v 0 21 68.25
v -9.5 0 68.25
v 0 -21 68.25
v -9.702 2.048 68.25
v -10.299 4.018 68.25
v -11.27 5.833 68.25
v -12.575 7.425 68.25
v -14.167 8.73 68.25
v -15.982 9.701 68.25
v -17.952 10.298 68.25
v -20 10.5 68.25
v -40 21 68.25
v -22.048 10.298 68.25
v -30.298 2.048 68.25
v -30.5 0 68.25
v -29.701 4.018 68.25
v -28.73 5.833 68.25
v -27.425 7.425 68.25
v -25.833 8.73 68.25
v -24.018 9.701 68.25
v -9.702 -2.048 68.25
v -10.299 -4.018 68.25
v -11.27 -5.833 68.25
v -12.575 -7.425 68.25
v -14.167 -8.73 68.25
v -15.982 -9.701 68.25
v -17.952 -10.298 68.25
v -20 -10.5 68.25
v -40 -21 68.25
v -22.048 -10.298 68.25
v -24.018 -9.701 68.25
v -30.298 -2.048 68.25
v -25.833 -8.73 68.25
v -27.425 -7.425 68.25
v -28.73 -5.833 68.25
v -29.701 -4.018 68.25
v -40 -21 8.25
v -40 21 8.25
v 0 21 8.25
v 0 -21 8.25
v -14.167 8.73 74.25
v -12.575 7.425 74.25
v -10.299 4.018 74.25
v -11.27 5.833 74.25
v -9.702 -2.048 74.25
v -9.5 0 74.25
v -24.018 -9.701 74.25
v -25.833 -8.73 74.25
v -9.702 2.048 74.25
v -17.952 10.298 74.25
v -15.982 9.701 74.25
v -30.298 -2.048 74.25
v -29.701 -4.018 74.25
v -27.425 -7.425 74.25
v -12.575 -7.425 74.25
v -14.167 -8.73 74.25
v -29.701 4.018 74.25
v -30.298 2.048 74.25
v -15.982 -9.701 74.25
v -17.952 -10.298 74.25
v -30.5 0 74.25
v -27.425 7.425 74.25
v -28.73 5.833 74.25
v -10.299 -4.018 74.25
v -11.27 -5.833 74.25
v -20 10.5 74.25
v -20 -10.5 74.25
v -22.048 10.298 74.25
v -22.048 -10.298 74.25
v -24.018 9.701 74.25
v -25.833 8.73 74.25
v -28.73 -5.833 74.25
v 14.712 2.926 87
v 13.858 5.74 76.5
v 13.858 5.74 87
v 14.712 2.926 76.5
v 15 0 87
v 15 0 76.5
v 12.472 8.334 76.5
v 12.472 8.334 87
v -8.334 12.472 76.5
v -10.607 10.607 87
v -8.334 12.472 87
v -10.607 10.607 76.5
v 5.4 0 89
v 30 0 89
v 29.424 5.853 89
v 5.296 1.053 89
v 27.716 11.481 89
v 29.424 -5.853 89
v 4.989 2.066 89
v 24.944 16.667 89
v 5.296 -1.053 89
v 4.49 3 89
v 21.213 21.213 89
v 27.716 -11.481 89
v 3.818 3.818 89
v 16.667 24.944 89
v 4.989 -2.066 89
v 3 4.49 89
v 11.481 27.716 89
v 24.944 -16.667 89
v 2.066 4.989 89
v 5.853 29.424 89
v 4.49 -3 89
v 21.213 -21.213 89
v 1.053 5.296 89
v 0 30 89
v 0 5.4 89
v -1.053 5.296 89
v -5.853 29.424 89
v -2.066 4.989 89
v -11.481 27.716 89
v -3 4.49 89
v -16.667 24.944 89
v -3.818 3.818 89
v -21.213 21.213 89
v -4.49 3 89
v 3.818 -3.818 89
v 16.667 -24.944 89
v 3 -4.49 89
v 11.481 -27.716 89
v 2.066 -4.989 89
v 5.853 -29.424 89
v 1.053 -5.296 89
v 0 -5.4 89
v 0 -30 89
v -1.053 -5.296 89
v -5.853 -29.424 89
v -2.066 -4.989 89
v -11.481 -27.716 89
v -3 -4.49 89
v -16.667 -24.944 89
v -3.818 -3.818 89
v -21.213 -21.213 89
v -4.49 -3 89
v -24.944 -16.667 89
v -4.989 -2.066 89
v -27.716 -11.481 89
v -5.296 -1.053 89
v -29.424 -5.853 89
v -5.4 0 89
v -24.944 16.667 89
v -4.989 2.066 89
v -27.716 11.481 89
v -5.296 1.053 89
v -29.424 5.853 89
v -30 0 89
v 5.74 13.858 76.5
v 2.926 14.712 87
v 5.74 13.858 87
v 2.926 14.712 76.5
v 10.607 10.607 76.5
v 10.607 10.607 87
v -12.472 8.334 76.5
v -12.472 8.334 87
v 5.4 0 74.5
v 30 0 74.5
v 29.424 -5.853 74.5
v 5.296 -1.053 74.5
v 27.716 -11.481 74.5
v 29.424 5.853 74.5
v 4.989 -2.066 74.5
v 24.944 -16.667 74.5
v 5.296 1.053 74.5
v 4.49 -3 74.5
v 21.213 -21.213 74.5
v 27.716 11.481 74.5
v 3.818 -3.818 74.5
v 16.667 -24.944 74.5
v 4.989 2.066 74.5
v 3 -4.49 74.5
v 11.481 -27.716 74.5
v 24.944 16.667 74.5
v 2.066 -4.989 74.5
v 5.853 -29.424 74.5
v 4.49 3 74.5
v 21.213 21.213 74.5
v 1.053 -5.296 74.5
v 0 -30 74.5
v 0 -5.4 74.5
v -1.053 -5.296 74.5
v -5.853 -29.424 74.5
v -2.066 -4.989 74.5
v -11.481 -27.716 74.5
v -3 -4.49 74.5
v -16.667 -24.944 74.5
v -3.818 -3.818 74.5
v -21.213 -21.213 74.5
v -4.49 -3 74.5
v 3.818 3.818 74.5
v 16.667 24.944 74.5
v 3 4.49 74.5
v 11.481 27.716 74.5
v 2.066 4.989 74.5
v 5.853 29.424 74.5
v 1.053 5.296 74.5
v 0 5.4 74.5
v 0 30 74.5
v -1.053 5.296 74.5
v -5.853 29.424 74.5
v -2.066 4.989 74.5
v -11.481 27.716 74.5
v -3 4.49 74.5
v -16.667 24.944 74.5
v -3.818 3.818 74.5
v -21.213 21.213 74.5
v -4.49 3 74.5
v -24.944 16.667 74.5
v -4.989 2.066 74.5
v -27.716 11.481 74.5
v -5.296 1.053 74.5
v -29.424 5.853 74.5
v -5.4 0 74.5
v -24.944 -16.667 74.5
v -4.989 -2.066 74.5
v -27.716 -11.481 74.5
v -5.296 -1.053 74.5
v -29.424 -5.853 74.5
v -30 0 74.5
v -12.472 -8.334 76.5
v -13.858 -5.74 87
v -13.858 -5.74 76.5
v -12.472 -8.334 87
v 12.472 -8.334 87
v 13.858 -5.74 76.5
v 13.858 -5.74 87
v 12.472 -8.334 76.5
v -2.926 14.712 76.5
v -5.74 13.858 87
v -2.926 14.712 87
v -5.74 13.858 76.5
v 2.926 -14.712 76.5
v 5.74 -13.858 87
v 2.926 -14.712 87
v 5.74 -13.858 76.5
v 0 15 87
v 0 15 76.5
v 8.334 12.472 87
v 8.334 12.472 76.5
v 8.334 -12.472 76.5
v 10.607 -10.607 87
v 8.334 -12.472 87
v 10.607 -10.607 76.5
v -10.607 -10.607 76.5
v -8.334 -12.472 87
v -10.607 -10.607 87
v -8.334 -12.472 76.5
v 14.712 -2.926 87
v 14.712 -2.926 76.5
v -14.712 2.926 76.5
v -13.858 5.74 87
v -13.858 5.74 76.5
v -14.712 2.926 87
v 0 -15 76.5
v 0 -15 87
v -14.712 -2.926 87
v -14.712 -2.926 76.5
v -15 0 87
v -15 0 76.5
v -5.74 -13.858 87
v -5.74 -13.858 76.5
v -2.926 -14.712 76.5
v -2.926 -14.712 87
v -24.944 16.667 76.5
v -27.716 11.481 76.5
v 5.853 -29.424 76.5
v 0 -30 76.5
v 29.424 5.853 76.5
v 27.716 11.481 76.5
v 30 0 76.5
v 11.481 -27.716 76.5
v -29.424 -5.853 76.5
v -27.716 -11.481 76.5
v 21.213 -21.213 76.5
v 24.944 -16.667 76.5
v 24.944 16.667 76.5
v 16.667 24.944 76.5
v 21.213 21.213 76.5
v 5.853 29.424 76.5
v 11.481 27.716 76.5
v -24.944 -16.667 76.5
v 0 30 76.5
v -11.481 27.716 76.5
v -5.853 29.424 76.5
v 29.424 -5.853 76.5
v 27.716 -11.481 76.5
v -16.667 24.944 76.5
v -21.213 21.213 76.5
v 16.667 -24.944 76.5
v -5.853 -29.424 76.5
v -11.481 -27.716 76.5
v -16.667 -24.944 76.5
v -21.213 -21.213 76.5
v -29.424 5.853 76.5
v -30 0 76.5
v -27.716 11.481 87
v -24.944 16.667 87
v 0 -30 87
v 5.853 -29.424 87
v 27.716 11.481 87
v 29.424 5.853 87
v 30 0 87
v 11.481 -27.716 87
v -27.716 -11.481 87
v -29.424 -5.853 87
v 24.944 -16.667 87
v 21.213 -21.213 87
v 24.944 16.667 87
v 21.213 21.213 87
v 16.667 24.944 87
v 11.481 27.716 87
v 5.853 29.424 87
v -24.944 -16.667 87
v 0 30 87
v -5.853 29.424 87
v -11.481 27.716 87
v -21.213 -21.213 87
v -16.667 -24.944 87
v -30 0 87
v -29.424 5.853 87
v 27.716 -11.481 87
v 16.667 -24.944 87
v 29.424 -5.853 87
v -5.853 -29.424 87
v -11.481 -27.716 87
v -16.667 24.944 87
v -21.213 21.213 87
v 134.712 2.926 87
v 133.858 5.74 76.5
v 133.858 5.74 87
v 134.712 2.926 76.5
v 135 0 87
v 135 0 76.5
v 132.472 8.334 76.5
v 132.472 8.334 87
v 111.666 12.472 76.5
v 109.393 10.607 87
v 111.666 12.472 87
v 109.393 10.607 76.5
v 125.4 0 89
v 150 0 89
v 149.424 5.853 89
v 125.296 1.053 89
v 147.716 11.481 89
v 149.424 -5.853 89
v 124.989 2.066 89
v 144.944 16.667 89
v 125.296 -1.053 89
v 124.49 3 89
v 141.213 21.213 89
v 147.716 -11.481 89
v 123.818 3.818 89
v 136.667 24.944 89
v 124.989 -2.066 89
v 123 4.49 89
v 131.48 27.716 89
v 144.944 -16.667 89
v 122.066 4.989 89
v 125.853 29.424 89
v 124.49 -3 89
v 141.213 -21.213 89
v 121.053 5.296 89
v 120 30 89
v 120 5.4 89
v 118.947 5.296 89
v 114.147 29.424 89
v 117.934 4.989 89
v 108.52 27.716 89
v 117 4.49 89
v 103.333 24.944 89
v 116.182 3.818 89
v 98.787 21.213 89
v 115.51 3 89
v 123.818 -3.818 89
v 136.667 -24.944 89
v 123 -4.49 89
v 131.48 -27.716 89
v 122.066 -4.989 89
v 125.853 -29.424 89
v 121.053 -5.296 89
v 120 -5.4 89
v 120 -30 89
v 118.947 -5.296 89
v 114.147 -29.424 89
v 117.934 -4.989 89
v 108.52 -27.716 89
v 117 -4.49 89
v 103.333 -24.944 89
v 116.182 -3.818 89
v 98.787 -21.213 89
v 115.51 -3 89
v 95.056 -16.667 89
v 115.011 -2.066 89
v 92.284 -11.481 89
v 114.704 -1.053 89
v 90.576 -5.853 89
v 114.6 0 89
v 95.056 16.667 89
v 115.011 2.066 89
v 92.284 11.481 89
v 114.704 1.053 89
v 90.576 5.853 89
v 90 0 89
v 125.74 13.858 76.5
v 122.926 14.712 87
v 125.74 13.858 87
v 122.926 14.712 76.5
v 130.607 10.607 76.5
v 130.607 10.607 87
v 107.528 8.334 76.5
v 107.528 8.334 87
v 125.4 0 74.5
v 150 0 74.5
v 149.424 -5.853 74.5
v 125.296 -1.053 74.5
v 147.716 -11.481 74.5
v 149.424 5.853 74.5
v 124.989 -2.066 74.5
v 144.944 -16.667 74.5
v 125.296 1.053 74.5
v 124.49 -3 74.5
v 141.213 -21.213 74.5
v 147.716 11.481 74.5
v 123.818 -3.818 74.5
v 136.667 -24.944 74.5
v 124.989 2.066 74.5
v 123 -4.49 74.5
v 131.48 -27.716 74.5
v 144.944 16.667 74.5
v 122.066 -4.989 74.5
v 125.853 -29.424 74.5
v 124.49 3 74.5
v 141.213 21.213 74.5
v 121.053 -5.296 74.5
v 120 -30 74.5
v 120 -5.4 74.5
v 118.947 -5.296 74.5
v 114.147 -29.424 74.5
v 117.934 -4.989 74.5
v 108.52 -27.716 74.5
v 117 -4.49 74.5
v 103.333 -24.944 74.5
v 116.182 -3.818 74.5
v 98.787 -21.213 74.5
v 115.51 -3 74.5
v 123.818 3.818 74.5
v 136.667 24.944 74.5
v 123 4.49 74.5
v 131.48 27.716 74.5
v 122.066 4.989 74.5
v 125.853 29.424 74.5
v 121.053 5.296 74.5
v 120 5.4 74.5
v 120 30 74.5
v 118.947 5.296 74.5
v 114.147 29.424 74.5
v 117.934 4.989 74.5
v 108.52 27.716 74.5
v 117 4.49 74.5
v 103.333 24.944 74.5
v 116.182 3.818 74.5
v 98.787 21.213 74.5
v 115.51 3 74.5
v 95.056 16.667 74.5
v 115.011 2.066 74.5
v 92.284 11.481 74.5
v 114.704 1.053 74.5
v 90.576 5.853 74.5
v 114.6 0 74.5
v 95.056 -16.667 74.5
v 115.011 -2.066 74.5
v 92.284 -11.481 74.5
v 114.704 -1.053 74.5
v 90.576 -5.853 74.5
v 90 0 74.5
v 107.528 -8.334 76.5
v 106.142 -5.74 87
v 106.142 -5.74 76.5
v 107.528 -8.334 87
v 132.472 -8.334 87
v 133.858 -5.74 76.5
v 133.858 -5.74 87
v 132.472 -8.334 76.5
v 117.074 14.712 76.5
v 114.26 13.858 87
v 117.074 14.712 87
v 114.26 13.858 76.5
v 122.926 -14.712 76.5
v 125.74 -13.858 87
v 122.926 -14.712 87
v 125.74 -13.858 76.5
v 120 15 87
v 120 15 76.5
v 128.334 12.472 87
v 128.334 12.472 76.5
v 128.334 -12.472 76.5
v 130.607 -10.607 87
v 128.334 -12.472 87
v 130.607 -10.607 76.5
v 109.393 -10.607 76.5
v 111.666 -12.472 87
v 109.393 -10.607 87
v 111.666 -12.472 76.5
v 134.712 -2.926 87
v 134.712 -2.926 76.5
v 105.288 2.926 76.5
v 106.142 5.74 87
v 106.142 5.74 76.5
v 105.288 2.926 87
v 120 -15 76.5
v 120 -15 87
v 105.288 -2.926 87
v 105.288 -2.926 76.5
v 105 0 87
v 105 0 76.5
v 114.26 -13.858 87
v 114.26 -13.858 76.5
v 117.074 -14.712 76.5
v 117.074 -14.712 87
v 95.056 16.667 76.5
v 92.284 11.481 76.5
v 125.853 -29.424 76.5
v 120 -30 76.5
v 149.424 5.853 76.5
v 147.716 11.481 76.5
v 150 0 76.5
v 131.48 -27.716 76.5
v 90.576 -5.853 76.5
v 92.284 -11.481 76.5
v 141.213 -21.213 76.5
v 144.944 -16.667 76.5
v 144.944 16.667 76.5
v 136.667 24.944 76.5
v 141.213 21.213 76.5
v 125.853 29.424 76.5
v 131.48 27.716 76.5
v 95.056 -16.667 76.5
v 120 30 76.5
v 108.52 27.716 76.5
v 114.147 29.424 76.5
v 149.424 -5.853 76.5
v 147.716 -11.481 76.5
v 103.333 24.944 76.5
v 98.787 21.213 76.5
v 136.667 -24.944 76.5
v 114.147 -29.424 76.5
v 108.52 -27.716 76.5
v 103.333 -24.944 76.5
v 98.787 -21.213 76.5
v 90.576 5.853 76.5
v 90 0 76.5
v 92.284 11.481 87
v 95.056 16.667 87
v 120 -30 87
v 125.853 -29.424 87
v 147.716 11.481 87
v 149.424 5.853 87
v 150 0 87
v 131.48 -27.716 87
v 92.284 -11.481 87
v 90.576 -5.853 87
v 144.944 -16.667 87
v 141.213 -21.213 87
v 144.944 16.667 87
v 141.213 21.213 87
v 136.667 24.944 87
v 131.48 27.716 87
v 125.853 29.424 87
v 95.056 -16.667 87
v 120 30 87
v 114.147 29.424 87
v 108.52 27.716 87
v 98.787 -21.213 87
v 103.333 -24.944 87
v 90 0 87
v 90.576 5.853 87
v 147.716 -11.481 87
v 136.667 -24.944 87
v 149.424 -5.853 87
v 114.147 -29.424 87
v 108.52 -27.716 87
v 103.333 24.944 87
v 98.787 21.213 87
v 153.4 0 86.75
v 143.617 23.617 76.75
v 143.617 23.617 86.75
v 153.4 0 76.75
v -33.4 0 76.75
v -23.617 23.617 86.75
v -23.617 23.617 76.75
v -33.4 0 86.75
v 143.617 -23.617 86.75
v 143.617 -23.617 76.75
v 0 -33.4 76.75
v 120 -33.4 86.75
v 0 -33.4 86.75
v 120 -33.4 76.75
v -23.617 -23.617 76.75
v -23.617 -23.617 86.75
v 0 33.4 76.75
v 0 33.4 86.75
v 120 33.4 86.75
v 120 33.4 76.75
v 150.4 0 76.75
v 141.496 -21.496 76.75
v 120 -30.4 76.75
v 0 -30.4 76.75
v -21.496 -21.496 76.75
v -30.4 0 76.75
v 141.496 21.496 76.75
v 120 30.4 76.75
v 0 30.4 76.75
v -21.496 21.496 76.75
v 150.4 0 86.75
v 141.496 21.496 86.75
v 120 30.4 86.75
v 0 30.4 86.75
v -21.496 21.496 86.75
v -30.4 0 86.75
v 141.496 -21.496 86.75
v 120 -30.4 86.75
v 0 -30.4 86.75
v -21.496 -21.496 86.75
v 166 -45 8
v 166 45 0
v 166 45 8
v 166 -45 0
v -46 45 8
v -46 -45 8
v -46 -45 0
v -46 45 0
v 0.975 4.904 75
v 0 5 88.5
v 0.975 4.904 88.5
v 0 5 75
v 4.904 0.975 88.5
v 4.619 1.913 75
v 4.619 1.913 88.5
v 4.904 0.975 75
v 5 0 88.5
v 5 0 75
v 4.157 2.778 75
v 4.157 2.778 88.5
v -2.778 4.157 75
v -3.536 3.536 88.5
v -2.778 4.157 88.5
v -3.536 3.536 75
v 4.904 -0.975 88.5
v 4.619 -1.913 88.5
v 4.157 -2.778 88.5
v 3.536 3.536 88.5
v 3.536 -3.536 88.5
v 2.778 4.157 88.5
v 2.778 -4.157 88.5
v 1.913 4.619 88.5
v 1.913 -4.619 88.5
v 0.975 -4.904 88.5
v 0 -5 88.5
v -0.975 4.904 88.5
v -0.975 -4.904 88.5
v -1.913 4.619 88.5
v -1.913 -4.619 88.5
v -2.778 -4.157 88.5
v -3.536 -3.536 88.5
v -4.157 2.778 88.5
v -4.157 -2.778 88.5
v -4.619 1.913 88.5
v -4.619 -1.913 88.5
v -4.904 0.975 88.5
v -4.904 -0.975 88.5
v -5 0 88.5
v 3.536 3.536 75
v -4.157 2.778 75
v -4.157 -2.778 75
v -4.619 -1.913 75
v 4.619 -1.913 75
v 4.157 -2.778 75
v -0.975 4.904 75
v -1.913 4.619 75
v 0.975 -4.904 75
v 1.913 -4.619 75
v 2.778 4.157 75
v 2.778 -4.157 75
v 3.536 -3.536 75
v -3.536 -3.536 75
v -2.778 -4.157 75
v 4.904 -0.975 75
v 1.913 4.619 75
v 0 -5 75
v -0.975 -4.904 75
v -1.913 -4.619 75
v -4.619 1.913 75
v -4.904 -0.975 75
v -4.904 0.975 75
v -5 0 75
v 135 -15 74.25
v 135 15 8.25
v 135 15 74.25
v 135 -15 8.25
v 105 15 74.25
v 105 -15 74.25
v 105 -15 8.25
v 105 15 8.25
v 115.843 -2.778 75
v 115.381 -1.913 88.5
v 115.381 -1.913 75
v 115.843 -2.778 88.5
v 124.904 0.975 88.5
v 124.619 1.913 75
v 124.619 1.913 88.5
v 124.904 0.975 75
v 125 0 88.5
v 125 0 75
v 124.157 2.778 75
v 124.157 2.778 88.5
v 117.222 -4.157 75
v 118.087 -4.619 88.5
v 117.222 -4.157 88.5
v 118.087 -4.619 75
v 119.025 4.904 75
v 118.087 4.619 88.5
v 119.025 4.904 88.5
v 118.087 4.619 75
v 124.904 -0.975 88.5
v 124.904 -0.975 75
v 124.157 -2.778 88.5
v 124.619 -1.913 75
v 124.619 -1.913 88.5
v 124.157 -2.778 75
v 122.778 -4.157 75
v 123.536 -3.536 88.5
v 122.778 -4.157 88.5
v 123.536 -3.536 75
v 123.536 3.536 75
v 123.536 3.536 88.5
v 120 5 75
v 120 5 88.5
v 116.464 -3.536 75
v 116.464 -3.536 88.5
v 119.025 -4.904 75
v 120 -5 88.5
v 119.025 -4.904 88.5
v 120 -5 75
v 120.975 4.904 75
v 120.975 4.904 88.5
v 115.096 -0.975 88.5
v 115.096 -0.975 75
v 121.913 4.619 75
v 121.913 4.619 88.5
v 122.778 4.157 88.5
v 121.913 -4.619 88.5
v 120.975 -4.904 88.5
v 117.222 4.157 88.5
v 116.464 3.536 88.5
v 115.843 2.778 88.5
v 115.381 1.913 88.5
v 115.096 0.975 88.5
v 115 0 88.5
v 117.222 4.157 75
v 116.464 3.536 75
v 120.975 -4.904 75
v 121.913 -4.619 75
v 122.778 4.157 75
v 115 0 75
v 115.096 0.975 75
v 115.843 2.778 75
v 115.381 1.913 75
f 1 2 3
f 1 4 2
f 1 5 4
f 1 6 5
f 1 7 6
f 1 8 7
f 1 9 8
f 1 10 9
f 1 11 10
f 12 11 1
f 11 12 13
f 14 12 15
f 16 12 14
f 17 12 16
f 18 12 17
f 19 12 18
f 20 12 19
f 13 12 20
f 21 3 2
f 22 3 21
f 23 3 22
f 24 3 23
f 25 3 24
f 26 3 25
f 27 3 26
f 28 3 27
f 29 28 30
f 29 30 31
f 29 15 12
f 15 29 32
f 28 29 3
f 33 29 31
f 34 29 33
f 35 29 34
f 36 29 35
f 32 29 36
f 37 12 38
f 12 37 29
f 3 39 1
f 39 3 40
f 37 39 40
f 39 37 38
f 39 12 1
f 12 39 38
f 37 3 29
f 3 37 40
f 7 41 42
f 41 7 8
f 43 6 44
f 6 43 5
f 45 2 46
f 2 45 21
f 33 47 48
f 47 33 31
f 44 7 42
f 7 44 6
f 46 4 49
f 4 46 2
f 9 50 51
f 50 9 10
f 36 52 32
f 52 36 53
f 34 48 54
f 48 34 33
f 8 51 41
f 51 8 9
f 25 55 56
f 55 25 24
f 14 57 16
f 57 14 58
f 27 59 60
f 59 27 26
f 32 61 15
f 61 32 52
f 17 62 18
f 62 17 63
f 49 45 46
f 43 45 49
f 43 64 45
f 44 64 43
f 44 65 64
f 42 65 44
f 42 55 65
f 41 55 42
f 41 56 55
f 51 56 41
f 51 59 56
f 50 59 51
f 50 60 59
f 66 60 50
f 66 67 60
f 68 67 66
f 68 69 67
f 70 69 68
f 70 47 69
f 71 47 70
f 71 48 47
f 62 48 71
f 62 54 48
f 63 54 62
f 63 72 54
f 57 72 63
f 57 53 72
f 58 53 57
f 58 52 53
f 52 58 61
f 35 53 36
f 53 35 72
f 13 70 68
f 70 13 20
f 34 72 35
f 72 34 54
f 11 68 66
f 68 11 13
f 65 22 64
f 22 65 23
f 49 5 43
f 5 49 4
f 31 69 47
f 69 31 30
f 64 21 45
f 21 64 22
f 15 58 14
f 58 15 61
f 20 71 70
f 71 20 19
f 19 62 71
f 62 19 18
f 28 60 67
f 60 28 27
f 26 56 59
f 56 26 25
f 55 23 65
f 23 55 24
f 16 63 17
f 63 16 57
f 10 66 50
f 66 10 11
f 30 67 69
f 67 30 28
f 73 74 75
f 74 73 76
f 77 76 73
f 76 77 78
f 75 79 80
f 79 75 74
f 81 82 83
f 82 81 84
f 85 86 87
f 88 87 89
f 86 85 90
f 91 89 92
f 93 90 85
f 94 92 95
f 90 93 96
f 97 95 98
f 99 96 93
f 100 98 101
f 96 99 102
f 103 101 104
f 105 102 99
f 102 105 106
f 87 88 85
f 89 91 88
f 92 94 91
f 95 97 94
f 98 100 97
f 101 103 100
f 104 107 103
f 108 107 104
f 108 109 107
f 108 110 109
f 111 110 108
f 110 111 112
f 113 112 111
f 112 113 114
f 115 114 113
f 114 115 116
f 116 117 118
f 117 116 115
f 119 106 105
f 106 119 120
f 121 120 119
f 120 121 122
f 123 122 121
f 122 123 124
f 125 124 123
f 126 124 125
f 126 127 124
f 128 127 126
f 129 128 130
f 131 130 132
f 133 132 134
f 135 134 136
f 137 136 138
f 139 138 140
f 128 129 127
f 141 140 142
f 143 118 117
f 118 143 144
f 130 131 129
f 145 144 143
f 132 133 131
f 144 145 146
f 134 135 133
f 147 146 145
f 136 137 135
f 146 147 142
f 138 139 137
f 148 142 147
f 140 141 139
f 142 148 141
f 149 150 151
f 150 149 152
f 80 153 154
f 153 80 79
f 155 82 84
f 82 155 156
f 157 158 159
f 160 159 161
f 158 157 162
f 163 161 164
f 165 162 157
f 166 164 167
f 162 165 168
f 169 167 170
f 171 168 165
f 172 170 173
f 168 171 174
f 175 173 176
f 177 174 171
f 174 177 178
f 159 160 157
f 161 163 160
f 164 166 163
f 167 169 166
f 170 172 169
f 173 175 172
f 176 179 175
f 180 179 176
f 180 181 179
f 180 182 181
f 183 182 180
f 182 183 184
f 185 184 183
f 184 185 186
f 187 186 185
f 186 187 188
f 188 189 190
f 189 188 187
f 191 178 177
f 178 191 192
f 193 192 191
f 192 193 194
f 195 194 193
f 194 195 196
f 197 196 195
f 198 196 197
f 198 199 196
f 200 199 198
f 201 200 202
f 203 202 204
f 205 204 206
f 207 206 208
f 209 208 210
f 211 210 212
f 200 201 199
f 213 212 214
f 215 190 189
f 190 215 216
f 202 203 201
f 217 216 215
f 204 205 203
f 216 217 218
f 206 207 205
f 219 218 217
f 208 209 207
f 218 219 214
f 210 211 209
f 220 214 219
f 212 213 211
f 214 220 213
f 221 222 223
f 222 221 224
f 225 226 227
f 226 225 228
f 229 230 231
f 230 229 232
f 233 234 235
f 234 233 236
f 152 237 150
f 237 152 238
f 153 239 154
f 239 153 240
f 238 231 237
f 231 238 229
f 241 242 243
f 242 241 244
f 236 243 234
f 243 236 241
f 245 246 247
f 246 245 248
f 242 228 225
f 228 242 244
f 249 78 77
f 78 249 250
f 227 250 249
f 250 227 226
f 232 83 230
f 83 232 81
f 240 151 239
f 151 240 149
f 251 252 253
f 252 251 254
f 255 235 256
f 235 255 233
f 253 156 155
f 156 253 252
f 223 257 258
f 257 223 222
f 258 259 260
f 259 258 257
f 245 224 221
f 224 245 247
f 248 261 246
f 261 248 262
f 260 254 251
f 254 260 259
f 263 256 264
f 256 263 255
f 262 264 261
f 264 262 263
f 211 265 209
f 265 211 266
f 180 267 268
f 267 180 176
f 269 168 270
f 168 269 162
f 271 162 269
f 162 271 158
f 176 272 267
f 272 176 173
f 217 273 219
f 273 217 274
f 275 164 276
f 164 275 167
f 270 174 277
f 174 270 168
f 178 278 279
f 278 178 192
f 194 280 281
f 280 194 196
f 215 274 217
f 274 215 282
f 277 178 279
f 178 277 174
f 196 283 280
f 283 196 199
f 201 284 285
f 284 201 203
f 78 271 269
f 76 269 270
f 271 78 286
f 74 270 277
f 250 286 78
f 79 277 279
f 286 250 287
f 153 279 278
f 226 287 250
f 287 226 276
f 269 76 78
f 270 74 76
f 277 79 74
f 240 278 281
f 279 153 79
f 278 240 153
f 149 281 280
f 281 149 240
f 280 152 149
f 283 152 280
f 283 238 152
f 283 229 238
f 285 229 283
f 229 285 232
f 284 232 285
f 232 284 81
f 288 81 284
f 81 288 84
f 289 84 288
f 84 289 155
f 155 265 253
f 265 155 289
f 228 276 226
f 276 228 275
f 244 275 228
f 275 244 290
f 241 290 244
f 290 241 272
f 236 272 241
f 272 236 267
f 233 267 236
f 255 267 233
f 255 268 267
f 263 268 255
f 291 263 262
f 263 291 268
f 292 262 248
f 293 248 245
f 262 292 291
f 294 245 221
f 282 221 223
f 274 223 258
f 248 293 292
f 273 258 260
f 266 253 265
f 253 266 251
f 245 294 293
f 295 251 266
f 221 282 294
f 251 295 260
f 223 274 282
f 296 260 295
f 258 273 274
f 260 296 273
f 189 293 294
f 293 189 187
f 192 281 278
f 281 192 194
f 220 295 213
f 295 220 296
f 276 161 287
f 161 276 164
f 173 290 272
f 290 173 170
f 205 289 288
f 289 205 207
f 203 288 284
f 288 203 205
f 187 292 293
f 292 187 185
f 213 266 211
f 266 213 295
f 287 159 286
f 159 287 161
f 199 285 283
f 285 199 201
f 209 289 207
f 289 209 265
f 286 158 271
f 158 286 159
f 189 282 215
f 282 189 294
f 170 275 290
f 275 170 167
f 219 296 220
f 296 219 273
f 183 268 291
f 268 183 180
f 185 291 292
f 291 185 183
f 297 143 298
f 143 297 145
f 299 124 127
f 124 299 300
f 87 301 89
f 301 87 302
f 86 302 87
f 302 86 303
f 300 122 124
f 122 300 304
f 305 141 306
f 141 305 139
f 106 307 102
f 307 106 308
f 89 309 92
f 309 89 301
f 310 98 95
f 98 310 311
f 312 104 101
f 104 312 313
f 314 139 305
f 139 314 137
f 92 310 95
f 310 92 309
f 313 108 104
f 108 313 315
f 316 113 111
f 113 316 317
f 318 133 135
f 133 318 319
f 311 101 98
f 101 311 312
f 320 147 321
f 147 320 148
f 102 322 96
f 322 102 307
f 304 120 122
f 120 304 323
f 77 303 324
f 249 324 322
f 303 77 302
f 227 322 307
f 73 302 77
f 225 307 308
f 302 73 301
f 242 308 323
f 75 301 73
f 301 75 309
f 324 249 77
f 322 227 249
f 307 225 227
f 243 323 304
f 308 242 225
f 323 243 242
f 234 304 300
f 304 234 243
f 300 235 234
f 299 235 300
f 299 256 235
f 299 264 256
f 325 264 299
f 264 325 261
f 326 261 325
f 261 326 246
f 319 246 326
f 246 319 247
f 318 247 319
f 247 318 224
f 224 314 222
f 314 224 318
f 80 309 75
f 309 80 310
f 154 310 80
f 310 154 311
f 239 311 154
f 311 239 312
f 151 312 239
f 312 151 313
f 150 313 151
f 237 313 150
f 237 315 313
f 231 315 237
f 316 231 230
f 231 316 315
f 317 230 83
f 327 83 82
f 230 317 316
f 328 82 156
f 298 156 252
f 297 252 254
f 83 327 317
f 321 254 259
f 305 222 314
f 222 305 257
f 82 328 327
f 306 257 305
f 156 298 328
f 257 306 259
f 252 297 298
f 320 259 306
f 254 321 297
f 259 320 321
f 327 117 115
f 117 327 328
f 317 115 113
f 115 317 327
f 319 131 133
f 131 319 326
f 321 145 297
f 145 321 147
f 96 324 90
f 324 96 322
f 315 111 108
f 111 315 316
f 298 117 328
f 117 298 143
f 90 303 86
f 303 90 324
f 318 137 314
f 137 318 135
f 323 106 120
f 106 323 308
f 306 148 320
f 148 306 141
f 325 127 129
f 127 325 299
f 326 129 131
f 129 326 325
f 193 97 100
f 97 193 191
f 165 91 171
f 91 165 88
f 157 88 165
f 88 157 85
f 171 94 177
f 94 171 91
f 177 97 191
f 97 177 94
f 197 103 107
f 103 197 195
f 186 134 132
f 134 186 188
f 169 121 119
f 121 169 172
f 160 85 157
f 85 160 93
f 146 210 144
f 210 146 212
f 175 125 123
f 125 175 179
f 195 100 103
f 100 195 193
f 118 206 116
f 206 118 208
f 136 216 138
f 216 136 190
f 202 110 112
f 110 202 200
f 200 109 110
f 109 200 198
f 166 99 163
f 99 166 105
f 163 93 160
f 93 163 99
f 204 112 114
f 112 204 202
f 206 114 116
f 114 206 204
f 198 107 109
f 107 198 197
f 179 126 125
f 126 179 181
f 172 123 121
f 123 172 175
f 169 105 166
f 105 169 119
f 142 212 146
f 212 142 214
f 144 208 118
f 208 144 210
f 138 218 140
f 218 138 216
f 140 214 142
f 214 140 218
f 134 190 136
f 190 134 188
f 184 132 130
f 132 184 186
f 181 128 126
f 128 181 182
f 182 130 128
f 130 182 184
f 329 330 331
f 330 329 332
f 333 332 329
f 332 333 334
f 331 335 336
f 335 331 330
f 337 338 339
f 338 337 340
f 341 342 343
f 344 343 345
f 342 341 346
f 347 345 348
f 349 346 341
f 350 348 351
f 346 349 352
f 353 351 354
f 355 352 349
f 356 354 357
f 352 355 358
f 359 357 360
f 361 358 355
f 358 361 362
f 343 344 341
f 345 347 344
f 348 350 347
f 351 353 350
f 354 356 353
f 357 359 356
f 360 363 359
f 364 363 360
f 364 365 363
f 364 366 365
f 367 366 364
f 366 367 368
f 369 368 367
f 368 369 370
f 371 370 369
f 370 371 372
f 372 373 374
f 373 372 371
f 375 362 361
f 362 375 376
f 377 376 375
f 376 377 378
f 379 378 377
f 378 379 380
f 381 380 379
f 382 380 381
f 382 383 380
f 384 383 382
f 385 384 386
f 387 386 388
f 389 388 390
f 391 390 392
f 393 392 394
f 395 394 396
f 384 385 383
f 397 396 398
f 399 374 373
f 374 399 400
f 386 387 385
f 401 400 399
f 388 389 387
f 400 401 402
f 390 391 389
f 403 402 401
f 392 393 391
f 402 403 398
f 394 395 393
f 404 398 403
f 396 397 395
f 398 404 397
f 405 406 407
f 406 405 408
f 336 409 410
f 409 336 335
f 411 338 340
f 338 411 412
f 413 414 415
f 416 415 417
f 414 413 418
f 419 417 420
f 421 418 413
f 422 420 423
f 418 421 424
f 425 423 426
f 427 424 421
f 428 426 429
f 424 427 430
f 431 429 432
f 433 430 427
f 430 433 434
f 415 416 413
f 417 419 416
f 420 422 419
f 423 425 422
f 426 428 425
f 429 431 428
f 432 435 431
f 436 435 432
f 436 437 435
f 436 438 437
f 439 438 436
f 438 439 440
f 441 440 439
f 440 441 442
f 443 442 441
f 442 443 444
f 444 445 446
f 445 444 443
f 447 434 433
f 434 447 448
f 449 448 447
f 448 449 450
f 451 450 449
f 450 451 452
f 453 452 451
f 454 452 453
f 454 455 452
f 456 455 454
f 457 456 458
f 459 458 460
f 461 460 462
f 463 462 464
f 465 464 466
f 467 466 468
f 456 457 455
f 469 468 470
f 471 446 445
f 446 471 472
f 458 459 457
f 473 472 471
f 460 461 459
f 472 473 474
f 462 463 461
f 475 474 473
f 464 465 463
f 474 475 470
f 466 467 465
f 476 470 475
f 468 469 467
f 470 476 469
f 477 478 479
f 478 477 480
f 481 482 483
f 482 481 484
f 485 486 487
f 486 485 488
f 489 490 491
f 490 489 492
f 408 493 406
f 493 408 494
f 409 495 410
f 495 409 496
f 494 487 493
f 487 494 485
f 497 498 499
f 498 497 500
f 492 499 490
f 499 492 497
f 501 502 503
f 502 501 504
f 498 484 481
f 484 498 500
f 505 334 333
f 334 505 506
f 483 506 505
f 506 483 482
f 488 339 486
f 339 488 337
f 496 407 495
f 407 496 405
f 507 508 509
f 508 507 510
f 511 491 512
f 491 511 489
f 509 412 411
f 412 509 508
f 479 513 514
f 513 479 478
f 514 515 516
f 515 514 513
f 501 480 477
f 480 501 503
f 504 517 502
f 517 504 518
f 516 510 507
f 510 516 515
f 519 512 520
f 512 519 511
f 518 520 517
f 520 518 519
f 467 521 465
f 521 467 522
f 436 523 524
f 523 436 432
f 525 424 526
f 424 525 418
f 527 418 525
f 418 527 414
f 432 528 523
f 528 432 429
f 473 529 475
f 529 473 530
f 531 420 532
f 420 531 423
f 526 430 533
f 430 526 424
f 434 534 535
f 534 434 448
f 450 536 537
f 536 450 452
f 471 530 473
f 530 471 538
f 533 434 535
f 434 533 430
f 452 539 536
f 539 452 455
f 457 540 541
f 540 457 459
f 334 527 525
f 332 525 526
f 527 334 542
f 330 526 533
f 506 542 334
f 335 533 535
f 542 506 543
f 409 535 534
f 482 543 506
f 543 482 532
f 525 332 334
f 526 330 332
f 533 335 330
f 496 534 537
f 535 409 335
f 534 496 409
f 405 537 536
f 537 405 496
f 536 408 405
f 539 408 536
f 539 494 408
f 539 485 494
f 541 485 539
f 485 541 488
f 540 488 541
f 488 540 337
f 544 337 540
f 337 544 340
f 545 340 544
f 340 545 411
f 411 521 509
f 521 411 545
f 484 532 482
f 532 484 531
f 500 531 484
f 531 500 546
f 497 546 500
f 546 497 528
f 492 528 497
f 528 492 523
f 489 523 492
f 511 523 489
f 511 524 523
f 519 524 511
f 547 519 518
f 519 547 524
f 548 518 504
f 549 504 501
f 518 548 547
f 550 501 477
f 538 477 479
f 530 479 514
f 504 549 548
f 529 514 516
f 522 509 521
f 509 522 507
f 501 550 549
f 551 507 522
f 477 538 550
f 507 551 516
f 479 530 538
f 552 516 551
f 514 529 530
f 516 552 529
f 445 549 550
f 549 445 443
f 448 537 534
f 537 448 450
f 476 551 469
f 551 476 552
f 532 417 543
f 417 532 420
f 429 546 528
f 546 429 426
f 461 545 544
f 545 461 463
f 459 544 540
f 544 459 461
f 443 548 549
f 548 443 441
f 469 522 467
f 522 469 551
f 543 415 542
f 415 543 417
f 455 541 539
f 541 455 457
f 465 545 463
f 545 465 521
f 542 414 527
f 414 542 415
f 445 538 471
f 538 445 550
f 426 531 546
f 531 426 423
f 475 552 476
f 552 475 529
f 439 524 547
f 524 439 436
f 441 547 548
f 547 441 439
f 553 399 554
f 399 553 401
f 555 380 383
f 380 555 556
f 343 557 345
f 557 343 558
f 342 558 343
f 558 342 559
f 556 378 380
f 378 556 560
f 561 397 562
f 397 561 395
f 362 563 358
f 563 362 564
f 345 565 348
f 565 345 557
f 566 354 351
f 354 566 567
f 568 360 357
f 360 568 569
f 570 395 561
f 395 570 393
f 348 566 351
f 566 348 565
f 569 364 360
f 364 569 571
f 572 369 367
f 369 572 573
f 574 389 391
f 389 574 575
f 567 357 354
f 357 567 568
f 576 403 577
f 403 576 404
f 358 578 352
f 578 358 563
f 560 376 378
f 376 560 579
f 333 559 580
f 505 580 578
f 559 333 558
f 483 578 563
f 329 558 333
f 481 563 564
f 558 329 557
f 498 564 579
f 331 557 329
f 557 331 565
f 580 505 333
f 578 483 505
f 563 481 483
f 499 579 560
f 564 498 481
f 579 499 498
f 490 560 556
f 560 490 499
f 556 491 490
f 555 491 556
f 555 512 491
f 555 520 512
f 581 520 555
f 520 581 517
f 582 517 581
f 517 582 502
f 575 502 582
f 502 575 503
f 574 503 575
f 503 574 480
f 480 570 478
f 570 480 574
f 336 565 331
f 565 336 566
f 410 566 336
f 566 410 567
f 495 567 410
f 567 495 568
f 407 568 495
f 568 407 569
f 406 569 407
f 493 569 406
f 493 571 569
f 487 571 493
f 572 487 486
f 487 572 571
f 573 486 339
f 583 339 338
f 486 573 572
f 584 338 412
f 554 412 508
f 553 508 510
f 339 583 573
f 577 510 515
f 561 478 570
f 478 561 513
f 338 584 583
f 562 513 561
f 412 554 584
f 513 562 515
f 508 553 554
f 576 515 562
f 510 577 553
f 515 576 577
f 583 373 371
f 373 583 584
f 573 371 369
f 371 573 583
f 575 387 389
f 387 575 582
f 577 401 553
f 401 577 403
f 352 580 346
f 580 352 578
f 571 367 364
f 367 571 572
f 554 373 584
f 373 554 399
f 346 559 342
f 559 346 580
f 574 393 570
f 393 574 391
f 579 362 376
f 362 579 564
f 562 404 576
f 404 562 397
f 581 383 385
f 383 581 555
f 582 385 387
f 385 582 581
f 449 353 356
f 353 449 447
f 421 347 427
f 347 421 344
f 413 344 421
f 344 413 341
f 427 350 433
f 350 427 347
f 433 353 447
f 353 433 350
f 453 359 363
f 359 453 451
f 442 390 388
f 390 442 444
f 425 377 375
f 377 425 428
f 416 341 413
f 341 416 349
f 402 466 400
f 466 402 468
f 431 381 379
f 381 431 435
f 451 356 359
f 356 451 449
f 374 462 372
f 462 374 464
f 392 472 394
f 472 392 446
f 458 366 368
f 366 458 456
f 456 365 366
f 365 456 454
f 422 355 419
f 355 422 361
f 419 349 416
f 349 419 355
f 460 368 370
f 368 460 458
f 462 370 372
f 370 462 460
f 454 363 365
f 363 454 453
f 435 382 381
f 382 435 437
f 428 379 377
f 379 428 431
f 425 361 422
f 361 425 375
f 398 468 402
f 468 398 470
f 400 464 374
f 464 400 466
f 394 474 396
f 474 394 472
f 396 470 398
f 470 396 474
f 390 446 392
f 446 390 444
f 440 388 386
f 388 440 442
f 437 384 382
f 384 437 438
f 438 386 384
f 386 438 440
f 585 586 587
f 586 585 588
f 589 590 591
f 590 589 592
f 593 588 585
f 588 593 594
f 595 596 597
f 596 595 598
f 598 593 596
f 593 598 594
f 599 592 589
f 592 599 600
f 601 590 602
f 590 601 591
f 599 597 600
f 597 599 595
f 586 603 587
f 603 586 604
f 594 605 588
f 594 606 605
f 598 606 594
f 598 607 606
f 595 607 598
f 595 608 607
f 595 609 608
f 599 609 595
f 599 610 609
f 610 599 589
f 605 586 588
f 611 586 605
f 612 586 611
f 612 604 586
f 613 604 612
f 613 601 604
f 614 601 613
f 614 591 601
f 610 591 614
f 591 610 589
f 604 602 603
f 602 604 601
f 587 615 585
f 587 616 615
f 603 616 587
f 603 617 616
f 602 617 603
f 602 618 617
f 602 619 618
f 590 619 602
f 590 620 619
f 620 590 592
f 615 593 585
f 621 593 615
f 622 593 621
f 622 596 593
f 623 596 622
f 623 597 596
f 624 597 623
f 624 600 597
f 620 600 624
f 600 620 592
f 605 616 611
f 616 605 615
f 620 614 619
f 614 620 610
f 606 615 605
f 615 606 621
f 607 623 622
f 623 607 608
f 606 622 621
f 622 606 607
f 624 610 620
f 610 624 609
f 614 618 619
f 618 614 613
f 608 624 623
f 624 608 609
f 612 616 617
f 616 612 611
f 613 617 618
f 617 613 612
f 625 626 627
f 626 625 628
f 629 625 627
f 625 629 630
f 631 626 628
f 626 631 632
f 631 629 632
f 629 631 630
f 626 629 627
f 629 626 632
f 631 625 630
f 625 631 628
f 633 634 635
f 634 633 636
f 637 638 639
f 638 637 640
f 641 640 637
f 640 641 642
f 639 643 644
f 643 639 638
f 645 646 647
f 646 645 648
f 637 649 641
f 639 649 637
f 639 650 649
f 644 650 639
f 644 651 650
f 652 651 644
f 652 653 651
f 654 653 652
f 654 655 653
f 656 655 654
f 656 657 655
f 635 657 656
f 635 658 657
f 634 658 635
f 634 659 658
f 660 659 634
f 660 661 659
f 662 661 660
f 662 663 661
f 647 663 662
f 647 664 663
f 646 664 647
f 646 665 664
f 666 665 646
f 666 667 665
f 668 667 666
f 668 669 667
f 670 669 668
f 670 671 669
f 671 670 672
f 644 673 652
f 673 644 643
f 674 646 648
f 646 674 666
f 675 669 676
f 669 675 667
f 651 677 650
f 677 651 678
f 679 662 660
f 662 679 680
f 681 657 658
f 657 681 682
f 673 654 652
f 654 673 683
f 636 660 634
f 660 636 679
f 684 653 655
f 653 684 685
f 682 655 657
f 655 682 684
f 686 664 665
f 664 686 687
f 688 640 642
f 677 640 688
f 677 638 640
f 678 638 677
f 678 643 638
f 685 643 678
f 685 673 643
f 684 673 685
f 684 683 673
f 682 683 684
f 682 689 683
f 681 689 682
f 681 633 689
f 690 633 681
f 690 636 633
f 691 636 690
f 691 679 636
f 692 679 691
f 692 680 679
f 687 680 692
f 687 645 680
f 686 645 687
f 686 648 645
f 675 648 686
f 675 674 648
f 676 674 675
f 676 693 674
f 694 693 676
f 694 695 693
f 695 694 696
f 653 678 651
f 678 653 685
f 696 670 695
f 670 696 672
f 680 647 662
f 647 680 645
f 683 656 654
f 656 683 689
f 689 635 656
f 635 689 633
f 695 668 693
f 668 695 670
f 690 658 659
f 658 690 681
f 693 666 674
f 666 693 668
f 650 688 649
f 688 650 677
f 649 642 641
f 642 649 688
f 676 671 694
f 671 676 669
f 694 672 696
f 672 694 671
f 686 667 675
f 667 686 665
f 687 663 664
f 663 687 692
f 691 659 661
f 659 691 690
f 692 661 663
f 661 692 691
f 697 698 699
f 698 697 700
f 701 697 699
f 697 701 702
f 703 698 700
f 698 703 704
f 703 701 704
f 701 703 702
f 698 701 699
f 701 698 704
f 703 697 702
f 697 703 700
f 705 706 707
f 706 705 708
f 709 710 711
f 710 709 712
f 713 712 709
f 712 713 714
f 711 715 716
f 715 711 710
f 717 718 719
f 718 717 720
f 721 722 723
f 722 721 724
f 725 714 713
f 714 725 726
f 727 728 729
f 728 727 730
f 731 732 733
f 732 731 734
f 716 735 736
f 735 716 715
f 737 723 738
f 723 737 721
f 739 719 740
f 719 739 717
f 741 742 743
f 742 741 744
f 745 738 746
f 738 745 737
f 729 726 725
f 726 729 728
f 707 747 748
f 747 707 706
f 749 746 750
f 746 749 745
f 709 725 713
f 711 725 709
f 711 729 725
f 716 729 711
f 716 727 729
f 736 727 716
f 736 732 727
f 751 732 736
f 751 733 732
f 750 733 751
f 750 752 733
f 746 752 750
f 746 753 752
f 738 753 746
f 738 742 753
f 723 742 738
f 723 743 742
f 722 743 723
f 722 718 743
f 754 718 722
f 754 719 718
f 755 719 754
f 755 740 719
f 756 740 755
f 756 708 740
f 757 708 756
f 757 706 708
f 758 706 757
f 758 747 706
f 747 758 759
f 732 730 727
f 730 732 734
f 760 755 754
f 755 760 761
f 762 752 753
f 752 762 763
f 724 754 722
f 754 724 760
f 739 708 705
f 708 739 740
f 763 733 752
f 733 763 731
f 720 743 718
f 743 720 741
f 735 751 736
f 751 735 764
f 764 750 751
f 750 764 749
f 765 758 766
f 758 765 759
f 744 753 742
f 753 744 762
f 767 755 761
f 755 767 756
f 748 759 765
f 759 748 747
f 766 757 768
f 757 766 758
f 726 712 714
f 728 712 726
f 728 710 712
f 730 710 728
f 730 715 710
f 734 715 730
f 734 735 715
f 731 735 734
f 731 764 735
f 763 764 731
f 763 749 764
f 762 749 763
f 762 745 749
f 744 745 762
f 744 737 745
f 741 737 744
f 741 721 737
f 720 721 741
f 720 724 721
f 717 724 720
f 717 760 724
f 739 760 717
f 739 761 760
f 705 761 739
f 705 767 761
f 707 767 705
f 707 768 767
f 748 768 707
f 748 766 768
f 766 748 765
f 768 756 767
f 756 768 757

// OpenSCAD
$fn = 32;

// ------------------------------------------------------------------------
// Motor belt drive: span 120 mm, pulleys d60, belt 10 mm wide
// Every part is its own module, assembly() places every instance.
// ------------------------------------------------------------------------

// --- part 1 ---
module base_plate() {
  difference() {
    translate([-106, -45, 0]) cube([212, 90, 8]);
  }
}

// --- part 2 ---
module motor() {
  union() {
    translate([-30, -21, 0]) cube([60, 42, 40]);
    translate([33, 0, 20]) rotate([0, 90, 0]) cylinder(h = 6, d = 21, center = true);
  }
}

// --- part 3 ---
module drive_shaft() {
  translate([0, 0, -6.75]) cylinder(h = 13.5, d = 10);
}

// --- part 4 ---
module pulley_drive() {
  difference() {
    union() {
      cylinder(h = 14.5, d = 30);
      cylinder(h = 2, d = 60);
      translate([0, 0, 12.5]) cylinder(h = 2, d = 60);
    }
    translate([0, 0, -1]) cylinder(h = 16.5, d = 10.8);
  }
}

// --- part 5 ---
module idler_post() {
  translate([-15, -15, 0]) cube([30, 30, 66]);
}

// --- part 6 ---
module driven_shaft() {
  translate([0, 0, -6.75]) cylinder(h = 13.5, d = 10);
}

// --- part 7 ---
module pulley_driven() {
  difference() {
    union() {
      cylinder(h = 14.5, d = 30);
      cylinder(h = 2, d = 60);
      translate([0, 0, 12.5]) cylinder(h = 2, d = 60);
    }
    translate([0, 0, -1]) cylinder(h = 16.5, d = 10.8);
  }
}

// --- part 8 ---
module drive_belt() {
  difference() {
    linear_extrude(height = 10) polygon(points = concat([for (a = [90 : 45 : 270]) [33.4 * cos(a), 33.4 * sin(a)]], [for (a = [270 : 45 : 450]) [120 + 33.4 * cos(a), 33.4 * sin(a)]]));
    translate([0, 0, -1]) linear_extrude(height = 12) polygon(points = concat([for (a = [90 : 45 : 270]) [30.4 * cos(a), 30.4 * sin(a)]], [for (a = [270 : 45 : 450]) [120 + 30.4 * cos(a), 30.4 * sin(a)]]));
  }
}

// --- assembly ---
module assembly() {
  color([0.80, 0.24, 0.20]) translate([60, 0, 0]) rotate([0, 0, 0]) base_plate();
  color([0.20, 0.45, 0.75]) translate([0, 0, 38.25]) rotate([0, 270, 0]) motor();
  color([0.25, 0.62, 0.32]) translate([0, 0, 81.75]) rotate([0, 0, 0]) drive_shaft();
  color([0.92, 0.70, 0.18]) translate([0, 0, 74.5]) rotate([0, 0, 0]) pulley_drive();
  color([0.58, 0.35, 0.70]) translate([120, 0, 8.25]) rotate([0, 0, 0]) idler_post();
  color([0.16, 0.66, 0.66]) translate([120, 0, 81.75]) rotate([0, 0, 0]) driven_shaft();
  color([0.85, 0.48, 0.18]) translate([120, 0, 74.5]) rotate([0, 0, 0]) pulley_driven();
  color([0.55, 0.60, 0.65]) translate([0, 0, 76.75]) rotate([0, 0, 0]) drive_belt();
}

assembly();
